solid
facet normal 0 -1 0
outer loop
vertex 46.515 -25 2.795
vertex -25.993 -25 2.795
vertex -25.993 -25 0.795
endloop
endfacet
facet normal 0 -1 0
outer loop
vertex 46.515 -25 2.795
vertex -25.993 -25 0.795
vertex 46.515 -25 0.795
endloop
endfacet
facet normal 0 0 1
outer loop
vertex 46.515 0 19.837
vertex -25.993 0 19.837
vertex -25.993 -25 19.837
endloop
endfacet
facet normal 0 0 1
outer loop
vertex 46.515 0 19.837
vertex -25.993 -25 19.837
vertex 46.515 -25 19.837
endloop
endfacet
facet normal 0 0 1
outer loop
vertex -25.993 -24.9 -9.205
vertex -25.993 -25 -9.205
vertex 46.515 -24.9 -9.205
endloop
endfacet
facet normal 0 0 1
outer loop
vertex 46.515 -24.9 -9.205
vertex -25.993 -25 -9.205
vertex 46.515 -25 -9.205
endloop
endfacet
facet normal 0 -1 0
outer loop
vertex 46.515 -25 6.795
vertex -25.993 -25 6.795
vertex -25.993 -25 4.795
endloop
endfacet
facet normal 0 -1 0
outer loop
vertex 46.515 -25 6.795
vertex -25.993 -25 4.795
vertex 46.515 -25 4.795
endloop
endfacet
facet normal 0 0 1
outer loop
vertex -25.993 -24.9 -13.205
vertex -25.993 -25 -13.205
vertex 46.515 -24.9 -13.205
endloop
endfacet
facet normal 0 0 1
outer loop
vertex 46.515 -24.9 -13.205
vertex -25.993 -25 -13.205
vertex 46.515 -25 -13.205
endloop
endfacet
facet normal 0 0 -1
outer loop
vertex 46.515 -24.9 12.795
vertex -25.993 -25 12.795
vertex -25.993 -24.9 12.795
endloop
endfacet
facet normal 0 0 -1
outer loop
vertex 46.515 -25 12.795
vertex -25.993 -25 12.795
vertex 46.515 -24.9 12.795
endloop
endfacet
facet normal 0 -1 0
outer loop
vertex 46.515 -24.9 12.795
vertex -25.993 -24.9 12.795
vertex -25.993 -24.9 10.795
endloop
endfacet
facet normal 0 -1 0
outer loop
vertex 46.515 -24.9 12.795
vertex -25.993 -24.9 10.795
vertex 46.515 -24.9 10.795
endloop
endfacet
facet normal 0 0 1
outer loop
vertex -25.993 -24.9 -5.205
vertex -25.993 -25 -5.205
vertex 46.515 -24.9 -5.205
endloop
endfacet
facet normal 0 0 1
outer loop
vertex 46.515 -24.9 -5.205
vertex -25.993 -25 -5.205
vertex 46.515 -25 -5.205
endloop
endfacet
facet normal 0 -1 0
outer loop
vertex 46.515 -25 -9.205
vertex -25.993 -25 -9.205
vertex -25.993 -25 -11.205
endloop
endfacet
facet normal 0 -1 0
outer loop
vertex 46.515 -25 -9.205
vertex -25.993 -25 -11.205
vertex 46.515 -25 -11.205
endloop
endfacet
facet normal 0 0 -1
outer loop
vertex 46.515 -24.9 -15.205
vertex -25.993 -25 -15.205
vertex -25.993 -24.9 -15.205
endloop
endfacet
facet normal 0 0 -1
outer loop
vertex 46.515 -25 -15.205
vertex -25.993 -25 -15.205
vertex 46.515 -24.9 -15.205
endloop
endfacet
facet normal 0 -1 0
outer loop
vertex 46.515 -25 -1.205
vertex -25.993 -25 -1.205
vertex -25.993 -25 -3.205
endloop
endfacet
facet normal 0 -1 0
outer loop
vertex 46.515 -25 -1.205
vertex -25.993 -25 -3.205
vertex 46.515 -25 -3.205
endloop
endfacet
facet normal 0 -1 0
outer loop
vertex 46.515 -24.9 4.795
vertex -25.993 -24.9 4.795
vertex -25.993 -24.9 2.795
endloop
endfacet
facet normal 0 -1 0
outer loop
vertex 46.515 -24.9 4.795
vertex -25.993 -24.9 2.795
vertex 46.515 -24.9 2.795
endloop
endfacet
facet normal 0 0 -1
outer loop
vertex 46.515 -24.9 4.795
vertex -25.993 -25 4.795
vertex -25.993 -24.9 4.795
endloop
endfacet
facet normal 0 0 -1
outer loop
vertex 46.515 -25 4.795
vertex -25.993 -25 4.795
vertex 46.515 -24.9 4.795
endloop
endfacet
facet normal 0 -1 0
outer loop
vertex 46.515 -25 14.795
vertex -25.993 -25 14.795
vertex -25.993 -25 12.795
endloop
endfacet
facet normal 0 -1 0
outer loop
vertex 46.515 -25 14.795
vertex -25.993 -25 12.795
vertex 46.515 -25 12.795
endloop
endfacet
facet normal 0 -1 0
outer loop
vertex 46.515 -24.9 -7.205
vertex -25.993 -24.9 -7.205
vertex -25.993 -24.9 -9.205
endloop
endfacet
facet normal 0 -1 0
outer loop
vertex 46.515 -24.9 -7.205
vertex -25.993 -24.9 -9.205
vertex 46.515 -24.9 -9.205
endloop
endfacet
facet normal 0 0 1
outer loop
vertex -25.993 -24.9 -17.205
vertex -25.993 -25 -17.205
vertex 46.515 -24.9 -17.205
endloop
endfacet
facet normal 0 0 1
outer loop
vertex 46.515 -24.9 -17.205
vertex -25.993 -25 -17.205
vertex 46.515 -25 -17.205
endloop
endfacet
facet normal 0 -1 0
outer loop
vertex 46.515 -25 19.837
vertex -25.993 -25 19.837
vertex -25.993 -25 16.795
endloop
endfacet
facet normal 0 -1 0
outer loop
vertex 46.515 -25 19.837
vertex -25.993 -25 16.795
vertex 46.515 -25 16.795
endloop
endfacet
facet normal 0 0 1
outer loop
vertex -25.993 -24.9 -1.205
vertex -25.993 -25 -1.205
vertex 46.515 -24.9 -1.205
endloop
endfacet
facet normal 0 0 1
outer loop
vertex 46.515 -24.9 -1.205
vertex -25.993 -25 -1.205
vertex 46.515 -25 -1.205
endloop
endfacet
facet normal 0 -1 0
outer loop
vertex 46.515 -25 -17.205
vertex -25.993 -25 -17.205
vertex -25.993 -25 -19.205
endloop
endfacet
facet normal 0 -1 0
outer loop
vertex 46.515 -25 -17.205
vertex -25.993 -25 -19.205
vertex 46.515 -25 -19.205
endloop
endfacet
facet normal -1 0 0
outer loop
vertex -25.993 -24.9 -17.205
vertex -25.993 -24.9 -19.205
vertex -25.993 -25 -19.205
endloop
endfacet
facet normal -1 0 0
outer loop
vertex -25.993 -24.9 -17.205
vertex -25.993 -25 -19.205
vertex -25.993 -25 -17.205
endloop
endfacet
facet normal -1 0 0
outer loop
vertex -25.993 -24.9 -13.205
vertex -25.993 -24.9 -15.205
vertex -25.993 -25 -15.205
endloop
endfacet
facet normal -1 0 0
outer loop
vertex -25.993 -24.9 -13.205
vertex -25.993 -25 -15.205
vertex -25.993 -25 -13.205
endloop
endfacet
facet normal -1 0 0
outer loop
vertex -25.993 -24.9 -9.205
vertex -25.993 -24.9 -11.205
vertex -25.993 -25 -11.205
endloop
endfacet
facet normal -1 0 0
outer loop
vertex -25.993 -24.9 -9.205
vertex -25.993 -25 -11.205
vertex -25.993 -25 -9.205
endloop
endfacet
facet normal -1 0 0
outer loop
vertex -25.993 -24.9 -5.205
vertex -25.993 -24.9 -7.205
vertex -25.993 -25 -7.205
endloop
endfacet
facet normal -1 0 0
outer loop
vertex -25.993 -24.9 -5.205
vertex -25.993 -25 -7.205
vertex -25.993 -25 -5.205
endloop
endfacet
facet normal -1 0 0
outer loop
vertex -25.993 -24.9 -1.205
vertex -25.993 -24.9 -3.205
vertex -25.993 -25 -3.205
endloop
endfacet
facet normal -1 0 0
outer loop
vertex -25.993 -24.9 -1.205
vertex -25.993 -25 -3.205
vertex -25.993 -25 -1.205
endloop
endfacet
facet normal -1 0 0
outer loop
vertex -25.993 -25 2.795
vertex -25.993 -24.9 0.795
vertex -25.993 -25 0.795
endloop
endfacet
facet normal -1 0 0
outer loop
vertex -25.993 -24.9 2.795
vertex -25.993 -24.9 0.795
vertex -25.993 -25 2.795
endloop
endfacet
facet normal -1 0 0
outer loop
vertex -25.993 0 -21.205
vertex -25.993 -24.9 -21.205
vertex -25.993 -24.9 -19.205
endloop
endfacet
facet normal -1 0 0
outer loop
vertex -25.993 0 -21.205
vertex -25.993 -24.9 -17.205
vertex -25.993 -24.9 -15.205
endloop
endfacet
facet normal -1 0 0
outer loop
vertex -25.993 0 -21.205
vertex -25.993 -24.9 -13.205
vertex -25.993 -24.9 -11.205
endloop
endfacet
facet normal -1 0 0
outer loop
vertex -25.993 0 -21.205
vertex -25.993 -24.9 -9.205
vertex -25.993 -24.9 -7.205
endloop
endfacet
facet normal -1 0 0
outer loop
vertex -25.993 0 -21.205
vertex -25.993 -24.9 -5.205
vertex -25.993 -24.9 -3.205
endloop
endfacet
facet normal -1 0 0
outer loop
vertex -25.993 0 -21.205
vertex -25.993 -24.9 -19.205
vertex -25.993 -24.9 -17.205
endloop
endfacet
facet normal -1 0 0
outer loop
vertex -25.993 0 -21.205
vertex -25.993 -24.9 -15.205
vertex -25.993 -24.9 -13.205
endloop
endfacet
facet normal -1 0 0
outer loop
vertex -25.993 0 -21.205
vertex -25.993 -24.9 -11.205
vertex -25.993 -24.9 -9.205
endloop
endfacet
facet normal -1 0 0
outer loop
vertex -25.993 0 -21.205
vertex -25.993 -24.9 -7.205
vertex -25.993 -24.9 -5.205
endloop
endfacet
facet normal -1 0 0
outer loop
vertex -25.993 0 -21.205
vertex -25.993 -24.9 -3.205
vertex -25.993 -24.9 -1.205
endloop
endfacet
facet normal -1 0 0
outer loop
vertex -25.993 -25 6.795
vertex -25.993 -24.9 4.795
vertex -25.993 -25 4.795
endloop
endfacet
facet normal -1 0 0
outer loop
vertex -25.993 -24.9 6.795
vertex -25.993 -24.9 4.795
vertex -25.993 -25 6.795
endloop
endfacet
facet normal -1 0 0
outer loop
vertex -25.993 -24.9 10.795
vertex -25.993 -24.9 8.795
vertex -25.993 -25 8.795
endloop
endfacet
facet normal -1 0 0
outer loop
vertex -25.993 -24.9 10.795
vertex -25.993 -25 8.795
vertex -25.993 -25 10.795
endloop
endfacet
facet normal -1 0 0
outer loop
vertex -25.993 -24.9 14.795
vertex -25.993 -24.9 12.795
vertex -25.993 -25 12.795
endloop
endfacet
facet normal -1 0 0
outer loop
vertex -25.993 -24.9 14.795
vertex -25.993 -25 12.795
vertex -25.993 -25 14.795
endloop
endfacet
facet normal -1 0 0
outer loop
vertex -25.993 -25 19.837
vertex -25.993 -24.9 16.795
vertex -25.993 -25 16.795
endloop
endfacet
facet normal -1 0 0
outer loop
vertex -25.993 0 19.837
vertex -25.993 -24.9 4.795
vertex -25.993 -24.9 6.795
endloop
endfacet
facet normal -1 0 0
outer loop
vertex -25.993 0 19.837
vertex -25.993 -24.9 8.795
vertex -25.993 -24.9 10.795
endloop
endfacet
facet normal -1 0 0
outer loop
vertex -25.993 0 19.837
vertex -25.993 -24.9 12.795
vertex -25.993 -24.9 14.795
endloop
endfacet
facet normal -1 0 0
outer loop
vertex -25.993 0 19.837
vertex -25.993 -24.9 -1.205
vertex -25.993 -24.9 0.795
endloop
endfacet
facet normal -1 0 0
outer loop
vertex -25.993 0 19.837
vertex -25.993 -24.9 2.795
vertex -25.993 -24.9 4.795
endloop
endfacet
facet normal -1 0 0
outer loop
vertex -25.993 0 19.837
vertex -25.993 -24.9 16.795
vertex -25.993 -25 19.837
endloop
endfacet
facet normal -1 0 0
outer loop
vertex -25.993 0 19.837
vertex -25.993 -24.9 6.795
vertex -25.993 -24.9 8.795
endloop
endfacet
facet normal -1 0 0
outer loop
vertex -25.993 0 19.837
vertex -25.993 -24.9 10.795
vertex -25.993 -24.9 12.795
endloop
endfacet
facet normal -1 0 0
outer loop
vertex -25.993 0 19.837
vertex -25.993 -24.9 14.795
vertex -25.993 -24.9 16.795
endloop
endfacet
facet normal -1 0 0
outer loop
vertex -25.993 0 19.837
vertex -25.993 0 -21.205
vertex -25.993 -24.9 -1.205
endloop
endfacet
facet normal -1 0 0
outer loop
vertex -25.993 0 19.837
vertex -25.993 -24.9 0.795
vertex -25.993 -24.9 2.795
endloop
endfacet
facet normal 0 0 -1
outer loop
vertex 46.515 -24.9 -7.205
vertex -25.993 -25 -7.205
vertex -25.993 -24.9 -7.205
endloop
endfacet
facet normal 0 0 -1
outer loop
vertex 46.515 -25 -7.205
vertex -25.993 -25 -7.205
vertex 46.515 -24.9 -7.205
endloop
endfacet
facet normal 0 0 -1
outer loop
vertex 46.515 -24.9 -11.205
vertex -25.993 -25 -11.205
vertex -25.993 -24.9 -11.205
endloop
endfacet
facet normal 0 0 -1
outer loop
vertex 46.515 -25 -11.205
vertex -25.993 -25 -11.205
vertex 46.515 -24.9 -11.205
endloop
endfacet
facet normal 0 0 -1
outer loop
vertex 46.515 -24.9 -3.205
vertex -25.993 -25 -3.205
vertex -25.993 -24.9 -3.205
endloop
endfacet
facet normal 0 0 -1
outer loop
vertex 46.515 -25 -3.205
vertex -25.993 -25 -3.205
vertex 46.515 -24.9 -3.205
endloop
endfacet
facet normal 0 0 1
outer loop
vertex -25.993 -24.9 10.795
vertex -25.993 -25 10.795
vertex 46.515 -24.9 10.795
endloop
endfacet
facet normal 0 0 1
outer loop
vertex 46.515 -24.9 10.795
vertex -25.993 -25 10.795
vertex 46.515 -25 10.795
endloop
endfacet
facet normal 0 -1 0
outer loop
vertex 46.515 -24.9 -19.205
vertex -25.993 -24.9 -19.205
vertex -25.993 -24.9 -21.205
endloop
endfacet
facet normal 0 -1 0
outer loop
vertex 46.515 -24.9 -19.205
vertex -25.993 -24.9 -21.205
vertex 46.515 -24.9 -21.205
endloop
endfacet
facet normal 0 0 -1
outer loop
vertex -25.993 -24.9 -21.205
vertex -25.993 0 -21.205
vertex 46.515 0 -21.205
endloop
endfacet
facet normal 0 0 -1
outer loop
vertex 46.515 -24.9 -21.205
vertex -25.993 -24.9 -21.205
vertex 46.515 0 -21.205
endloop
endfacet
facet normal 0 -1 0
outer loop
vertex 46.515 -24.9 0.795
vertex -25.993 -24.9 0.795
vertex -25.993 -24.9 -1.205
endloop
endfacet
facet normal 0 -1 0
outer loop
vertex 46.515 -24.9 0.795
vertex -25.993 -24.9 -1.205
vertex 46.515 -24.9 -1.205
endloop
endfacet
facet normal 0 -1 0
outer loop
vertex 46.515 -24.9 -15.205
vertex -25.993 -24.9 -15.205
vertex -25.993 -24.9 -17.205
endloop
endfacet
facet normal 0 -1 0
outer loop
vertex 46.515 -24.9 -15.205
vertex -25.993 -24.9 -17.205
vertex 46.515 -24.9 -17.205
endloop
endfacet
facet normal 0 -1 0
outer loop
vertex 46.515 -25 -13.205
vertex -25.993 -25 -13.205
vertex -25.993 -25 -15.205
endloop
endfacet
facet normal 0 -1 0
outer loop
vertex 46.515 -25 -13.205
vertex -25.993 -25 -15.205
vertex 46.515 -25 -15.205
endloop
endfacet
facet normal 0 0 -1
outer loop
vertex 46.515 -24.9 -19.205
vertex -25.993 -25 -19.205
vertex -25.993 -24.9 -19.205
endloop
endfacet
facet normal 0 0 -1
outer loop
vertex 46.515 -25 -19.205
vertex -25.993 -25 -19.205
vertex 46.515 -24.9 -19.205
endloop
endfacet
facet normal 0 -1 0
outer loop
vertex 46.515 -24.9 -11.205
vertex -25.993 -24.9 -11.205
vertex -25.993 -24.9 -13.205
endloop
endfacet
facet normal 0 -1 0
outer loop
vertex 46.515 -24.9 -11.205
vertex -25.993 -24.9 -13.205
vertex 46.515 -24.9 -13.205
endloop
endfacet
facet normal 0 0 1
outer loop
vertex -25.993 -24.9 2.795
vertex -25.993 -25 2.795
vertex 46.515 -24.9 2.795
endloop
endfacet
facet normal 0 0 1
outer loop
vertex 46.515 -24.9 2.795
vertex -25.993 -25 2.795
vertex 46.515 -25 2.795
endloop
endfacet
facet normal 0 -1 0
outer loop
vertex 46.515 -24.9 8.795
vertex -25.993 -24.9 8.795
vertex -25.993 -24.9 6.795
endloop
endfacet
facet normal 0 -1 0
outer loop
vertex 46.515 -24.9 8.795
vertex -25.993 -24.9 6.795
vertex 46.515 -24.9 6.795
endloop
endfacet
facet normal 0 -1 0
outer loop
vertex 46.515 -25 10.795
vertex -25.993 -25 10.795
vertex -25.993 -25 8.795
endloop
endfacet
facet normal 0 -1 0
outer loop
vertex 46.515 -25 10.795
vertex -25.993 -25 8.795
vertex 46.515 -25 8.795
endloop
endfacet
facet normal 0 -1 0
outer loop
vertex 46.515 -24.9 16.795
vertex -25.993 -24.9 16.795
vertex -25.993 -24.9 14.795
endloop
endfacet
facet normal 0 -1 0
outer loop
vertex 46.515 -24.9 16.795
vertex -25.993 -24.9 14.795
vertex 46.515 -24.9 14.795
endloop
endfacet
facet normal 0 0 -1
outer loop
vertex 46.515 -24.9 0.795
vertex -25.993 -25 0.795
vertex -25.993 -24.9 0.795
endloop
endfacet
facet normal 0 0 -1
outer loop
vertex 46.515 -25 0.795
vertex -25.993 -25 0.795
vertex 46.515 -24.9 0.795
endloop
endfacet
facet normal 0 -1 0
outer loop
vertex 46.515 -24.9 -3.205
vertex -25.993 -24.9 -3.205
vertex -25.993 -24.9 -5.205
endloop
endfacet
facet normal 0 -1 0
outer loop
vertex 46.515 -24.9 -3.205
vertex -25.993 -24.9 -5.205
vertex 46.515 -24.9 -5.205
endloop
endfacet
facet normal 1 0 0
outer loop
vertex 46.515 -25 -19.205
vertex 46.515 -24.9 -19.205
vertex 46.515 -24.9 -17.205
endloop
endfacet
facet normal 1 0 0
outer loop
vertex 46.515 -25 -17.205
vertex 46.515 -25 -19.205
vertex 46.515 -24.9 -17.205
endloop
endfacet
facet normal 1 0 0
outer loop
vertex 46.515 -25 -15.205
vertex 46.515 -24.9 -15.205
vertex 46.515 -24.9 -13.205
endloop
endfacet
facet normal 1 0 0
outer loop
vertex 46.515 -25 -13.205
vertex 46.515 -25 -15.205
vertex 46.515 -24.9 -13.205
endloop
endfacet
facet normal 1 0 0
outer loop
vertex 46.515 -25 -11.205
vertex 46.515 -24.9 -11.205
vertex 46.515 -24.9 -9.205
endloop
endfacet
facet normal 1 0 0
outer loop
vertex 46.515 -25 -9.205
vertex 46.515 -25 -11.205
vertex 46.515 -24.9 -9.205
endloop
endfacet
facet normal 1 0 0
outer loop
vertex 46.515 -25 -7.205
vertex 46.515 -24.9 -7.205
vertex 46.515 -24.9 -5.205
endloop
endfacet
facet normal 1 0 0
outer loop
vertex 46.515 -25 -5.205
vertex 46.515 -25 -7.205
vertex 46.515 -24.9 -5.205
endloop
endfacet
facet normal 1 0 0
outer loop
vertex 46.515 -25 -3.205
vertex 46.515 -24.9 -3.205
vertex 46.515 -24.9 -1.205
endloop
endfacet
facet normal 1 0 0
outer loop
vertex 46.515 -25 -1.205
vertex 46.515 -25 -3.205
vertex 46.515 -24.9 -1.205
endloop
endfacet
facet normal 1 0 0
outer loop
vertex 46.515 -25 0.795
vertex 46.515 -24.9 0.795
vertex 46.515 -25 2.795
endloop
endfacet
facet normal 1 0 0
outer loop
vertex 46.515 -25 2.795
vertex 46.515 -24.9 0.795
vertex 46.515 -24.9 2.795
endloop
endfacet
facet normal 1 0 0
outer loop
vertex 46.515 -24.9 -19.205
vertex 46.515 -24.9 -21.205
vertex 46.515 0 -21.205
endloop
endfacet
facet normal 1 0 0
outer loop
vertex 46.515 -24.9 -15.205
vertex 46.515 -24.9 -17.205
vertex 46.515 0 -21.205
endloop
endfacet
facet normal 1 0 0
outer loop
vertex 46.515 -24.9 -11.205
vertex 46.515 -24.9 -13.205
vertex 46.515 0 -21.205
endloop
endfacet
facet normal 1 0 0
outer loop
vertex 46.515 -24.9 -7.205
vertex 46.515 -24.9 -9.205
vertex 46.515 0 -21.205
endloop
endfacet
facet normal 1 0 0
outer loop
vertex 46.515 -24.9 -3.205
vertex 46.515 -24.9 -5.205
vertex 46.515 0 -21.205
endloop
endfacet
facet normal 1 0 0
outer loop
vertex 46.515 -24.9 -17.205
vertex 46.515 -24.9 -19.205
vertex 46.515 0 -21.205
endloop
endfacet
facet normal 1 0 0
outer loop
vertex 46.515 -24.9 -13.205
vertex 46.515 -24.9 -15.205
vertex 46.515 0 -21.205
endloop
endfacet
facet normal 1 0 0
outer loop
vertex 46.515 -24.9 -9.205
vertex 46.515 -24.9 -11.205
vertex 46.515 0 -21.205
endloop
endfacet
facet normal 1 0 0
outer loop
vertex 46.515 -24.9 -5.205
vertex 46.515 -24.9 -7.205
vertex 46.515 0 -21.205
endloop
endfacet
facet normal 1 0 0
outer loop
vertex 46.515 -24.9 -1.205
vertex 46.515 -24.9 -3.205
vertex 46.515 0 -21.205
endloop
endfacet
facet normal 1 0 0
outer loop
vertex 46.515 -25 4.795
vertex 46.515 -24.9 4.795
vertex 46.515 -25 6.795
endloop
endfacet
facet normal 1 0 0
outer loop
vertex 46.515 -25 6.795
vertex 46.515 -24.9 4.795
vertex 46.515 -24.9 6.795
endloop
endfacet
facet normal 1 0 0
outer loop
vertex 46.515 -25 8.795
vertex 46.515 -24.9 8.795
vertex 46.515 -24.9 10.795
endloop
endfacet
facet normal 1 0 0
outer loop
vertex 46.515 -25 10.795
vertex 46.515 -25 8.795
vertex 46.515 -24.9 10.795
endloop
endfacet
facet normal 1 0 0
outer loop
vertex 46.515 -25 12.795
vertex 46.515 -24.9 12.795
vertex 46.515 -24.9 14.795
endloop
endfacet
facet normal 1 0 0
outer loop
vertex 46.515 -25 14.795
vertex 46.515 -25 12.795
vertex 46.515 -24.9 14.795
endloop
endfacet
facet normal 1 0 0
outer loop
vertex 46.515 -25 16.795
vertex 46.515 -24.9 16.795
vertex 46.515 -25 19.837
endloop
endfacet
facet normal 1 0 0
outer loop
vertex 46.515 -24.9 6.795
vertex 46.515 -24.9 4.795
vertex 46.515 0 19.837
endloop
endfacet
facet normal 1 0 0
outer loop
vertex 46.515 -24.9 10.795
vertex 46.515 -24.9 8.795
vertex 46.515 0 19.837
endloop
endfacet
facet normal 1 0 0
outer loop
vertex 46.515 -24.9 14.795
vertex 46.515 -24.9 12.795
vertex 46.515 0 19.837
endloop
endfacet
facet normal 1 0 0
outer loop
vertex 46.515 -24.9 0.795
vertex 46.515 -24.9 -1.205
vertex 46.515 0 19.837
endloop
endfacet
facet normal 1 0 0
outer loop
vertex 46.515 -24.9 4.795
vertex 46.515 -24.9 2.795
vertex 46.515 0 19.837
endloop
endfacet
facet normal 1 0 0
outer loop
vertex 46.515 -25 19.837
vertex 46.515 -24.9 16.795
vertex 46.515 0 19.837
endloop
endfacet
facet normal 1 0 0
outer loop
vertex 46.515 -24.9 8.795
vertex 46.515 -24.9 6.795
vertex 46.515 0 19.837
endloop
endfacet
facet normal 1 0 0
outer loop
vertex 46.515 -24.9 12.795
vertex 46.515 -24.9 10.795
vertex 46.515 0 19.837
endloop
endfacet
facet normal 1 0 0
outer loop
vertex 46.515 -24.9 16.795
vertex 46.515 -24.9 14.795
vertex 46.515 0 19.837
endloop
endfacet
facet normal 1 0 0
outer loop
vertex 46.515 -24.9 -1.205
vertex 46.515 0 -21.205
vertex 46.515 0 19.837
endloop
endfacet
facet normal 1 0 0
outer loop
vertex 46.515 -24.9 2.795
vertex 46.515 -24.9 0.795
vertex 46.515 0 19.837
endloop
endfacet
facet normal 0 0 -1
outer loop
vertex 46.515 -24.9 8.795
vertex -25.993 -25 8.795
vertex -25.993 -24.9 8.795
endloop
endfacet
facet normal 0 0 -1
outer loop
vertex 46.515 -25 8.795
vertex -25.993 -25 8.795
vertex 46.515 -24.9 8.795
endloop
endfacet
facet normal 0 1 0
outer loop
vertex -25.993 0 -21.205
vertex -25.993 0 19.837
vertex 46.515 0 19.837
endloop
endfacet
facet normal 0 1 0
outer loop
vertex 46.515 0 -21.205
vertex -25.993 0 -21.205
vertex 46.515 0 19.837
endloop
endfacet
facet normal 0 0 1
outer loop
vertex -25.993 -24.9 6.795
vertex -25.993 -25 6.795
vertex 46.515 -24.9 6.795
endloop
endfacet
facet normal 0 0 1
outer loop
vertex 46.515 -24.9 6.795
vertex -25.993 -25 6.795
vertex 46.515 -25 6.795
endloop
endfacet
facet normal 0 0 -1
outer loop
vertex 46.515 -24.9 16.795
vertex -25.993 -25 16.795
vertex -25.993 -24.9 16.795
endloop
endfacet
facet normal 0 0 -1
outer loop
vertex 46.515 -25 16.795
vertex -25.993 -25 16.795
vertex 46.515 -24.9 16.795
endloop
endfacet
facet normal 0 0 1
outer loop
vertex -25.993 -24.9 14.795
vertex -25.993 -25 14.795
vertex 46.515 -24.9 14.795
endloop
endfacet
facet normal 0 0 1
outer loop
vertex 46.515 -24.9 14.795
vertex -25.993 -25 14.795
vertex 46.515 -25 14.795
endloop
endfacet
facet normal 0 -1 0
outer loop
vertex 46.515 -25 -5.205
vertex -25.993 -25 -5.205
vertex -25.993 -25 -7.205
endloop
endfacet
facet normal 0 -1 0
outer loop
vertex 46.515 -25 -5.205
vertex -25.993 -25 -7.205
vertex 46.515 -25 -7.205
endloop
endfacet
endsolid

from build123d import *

# Parameters (mm, degrees)
F0_W     = 72.508016
F0_H     = 41.042272
F1_DEPTH = 25
F2_W     = 72.508016
F2_H     = 2
F3_DEPTH = 0.1


with BuildPart() as f1:
    # F0 (on Front) → F1 (new body)
    with BuildSketch(Plane.XZ):
        with Locations((10.26057, -0.684036)):
            Rectangle(F0_W, F0_H)
    extrude(amount=F1_DEPTH)

    # F2 (on face) → F3 (cut)
    with BuildSketch(Plane.XZ.offset(25)):
        with Locations((10.26057, -20.205172)):
            Rectangle(F2_W, F2_H)
        with Locations((10.26057, -16.205172)):
            Rectangle(F2_W, F2_H)
        with Locations((10.26057, -12.205172)):
            Rectangle(F2_W, F2_H)
        with Locations((10.26057, -8.205172)):
            Rectangle(F2_W, F2_H)
        with Locations((10.26057, -4.205172)):
            Rectangle(F2_W, F2_H)
        with Locations((10.26057, -0.205172)):
            Rectangle(F2_W, F2_H)
        with Locations((10.26057, 3.794828)):
            Rectangle(F2_W, F2_H)
        with Locations((10.26057, 7.794828)):
            Rectangle(F2_W, F2_H)
        with Locations((10.26057, 11.794828)):
            Rectangle(F2_W, F2_H)
        with Locations((10.26057, 15.794828)):
            Rectangle(F2_W, F2_H)
    extrude(amount=-F3_DEPTH, mode=Mode.SUBTRACT)


solid = f1.part
